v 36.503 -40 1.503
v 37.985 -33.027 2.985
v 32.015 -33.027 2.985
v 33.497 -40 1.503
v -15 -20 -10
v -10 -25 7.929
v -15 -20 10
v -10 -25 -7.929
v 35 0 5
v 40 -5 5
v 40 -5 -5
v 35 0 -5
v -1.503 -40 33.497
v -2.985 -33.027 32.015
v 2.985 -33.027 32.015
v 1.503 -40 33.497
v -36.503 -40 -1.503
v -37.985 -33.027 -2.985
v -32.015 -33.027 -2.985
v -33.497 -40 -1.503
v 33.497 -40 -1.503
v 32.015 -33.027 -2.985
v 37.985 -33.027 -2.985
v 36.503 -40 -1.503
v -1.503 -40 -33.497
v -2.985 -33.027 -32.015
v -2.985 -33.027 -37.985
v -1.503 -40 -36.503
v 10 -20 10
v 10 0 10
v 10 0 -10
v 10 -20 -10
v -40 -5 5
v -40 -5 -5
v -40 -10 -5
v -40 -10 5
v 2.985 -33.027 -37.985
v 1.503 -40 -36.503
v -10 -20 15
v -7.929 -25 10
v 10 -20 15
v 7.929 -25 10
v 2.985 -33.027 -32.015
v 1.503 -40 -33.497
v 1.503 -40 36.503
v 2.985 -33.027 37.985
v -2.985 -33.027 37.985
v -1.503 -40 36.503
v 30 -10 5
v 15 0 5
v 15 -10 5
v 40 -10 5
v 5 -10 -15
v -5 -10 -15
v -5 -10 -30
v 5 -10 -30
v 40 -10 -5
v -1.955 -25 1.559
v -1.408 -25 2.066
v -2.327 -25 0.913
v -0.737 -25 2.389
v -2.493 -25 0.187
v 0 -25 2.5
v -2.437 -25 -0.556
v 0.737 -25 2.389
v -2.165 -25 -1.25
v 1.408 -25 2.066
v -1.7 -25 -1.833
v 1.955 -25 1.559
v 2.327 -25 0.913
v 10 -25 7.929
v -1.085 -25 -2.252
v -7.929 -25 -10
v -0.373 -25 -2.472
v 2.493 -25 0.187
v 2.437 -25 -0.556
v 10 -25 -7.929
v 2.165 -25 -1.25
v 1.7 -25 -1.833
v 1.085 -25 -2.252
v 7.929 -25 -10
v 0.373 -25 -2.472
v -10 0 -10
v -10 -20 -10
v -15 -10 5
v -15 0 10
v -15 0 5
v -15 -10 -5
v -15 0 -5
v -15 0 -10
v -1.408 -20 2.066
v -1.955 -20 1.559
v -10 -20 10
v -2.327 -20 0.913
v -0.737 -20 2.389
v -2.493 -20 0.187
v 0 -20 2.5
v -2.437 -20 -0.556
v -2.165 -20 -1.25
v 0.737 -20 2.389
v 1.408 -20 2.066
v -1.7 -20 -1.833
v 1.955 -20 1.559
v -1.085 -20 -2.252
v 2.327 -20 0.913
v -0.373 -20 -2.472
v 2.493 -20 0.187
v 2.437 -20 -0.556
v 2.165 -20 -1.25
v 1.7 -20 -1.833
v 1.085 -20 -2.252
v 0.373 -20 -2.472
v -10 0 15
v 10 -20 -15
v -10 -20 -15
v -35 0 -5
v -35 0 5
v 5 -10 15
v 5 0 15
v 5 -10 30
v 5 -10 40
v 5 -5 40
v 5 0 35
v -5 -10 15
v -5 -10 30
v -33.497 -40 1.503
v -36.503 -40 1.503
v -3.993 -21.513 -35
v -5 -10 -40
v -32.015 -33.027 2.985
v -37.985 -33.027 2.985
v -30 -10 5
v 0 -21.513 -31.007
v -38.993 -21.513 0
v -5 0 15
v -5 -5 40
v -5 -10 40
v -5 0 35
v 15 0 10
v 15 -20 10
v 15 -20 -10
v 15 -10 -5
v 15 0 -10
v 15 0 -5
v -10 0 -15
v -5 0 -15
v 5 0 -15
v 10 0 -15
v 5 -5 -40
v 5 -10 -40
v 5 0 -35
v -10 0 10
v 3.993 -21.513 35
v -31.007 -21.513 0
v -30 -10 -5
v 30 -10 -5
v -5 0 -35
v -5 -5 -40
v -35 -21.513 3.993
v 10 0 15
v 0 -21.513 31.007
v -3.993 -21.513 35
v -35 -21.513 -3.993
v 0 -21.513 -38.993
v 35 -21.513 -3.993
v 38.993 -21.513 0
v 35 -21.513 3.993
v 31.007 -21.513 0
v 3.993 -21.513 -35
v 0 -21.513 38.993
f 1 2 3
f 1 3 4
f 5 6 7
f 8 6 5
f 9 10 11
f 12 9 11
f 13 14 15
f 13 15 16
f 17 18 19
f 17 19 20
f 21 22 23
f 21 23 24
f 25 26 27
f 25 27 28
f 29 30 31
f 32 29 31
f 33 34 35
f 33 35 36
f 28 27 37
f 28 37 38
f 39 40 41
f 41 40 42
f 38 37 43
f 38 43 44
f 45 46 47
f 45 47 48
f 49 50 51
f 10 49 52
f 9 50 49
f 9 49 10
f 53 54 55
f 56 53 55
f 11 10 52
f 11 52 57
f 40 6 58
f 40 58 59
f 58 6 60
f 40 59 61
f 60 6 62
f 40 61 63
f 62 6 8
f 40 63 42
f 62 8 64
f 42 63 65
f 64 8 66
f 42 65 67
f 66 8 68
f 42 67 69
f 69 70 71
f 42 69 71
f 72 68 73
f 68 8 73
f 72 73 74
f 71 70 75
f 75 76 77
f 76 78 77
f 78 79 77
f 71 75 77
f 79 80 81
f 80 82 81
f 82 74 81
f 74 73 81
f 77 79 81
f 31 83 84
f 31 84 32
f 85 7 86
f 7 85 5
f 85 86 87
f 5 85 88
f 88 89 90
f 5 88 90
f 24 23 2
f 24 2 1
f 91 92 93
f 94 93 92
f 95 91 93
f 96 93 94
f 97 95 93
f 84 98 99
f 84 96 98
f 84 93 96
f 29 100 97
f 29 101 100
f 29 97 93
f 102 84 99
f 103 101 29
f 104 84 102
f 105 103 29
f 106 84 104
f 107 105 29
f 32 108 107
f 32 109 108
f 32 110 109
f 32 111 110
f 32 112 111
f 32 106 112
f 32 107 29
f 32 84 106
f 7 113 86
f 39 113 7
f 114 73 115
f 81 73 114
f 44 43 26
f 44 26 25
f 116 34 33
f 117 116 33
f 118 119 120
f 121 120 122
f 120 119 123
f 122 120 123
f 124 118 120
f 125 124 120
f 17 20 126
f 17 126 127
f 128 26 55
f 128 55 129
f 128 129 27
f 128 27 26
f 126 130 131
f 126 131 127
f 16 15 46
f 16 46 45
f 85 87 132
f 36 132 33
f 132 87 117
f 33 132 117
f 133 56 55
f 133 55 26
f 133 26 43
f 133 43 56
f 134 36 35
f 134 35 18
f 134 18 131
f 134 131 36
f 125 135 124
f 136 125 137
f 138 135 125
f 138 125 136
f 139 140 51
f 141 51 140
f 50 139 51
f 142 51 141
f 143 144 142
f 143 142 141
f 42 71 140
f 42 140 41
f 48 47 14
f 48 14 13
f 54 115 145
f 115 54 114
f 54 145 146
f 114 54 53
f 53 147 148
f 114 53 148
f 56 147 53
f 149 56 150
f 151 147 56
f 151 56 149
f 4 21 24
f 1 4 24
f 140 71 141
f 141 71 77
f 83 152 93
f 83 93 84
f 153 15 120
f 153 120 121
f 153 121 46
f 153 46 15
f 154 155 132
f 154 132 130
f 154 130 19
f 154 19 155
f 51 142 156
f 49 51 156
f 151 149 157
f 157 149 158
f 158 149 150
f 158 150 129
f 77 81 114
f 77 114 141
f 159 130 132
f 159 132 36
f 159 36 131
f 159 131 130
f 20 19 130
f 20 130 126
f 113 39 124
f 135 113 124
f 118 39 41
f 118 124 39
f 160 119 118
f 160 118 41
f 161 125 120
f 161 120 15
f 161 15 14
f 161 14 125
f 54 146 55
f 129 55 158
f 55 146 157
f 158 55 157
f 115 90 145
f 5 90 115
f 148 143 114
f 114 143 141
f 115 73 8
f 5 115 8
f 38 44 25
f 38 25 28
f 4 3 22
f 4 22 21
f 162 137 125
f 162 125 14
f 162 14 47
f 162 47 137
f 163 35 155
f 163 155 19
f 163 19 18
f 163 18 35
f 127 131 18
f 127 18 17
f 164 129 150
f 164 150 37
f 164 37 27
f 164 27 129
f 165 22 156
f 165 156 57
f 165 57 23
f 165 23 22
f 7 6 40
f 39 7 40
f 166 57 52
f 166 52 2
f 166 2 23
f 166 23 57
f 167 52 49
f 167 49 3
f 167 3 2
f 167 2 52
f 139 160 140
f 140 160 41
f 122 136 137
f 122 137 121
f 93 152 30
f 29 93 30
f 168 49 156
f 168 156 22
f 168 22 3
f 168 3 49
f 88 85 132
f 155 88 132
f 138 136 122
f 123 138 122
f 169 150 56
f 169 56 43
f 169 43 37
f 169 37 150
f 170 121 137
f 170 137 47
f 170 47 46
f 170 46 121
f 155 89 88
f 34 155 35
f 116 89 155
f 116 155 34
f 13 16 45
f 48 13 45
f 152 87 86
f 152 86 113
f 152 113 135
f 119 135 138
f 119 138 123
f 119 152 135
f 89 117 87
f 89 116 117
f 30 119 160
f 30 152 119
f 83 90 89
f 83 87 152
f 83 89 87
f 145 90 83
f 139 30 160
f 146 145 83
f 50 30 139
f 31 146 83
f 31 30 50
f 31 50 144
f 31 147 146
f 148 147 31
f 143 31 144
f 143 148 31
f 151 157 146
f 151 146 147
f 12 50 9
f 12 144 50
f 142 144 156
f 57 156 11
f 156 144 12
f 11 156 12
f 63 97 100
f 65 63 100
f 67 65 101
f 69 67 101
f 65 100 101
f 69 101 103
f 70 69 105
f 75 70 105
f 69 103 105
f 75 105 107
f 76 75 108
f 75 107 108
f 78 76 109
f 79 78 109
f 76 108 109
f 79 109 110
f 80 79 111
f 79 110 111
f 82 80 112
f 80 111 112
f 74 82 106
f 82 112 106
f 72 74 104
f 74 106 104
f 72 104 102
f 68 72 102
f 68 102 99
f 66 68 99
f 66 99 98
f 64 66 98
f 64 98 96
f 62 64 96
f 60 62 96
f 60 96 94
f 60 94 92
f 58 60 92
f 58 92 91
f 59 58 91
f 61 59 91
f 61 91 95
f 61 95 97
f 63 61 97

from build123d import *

# Parameters (mm, degrees)
SKETCH1_W         = 30
SKETCH1_H         = 30
CENTER_DEPTH      = 25
SKETCH2_W         = 20
SKETCH2_H         = 20
CENTER_HOLE_DEPTH = 20
SKETCH3_W         = 25
SKETCH3_H         = 10
ARM_DEPTH         = 10
SKETCH5_R         = 2.5
SCREW_HOLE_DEPTH  = 48.16990566
SKETCH7_W         = 10
SKETCH7_H         = 10
LEG_DEPTH         = 30
LEG_TAPER         = 5
CIRPATTERN1_COUNT = 4
CHAMFER1_SIZE     = 5
CHAMFER2_SIZE     = 5
CHAMFER3_SIZE     = 5
CHAMFER4_SIZE     = 7
CHAMFER4_SIZE_2   = 0.872143839


with BuildPart() as part:
    # Sketch1 → center (new body)
    with BuildSketch(Plane(origin=(0, 0, 0), x_dir=(1, 0, 0), z_dir=(0, 1, 0))):
        Rectangle(SKETCH1_W, SKETCH1_H)
    extrude(amount=-CENTER_DEPTH)

    # Sketch2 → center hole (cut)
    with BuildSketch(Plane(origin=(0, 0, 0), x_dir=(1, 0, 0), z_dir=(0, 1, 0))):
        Rectangle(SKETCH2_W, SKETCH2_H)
    extrude(amount=-CENTER_HOLE_DEPTH, mode=Mode.SUBTRACT)

    # Sketch3 → arm (add)
    with BuildSketch(Plane(origin=(0, 0, 0), x_dir=(1, 0, 0), z_dir=(0, 1, 0))):
        with Locations((27.5, 0)):
            Rectangle(SKETCH3_W, SKETCH3_H)
    arm = extrude(amount=-ARM_DEPTH)

    # Sketch5 → screw hole (cut, through all)
    with BuildSketch(Plane(origin=(0, -20, 0), x_dir=(1, 0, 0), z_dir=(0, 1, 0))):
        with Locations(Location((0, 0, 0), (0, 0, 270))):
            Circle(SKETCH5_R)
    extrude(amount=-SCREW_HOLE_DEPTH, mode=Mode.SUBTRACT)

    # Sketch7 → leg (add)
    with BuildSketch(Plane.XZ.offset(10)):
        with Locations((35, 0)):
            Rectangle(SKETCH7_W, SKETCH7_H)
    leg = extrude(amount=LEG_DEPTH, taper=LEG_TAPER)

    # CirPattern1: arm, leg ×4 about axis
    cirpattern1_axis = Axis((0, 0, 0), (0, 1, 0))
    add([arm.rotate(cirpattern1_axis, i * 360 / CIRPATTERN1_COUNT) for i in range(1, CIRPATTERN1_COUNT)])
    add([leg.rotate(cirpattern1_axis, i * 360 / CIRPATTERN1_COUNT) for i in range(1, CIRPATTERN1_COUNT)])

    # Chamfer1
    chamfer1_edges = [part.edges().sort_by_distance(p)[0] for p in [
        (15, -12.5, 15),
        (-15, -12.5, 15),
        (-15, -12.5, -15),
        (15, -12.5, -15),
    ]]
    chamfer(chamfer1_edges, length=CHAMFER1_SIZE)

    # Chamfer2
    chamfer2_edges = [part.edges().sort_by_distance(p)[0] for p in [
        (40, 0, 0),
        (0, 0, -40),
        (-40, 0, 0),
        (0, 0, 40),
    ]]
    chamfer(chamfer2_edges, length=CHAMFER2_SIZE)

    # Chamfer3
    chamfer3_edges = [part.edges().sort_by_distance(p)[0] for p in [
        (-15, -25, 0),
        (0, -25, 15),
        (15, -25, 0),
        (0, -25, -15),
        (12.5, -25, 12.5),
        (12.5, -25, -12.5),
        (-12.5, -25, -12.5),
        (-12.5, -25, 12.5),
    ]]
    chamfer(chamfer3_edges, length=CHAMFER3_SIZE)

    # Chamfer4
    # the kernel refuses this chamfer: 7, 0.872143839 mm, written as the material it takes off along each edge
    with BuildSketch(Plane(origin=(-37.375340094, -40, 20.570322389), x_dir=(-0.08715574274765861, 0.9961946980917454, 0), z_dir=(0, 0, -1)), Plane(origin=(-55.570322389, -40, -2.375340094), x_dir=(0, 0.9961946980917455, -0.08715574274765818), z_dir=(1, 0, 0)), Plane(origin=(-32.624659906, -40, -20.570322389), x_dir=(0.08715574274765861, 0.9961946980917454, 0), z_dir=(0, 0, 1)), Plane(origin=(-14.429677611, -40, 2.375340094), x_dir=(0, 0.9961946980917455, 0.08715574274765825), z_dir=(-1, 0, 0)), Plane(origin=(20.570322389, -40, 37.375340094), x_dir=(0, 0.9961946980917454, 0.08715574274765861), z_dir=(-1, 0, 0)), Plane(origin=(-2.375340094, -40, 55.570322389), x_dir=(-0.08715574274765818, 0.9961946980917455, 0), z_dir=(0, 0, -1)), Plane(origin=(-20.570322389, -40, 32.624659906), x_dir=(0, 0.9961946980917454, -0.08715574274765861), z_dir=(1, 0, 0)), Plane(origin=(2.375340094, -40, 14.429677611), x_dir=(0.08715574274765818, 0.9961946980917455, 0), z_dir=(0, 0, 1)), Plane(origin=(37.375340094, -40, -20.570322389), x_dir=(0.08715574274765861, 0.9961946980917454, 0), z_dir=(0, 0, 1)), Plane(origin=(55.570322389, -40, 2.375340094), x_dir=(0, 0.9961946980917455, 0.08715574274765825), z_dir=(-1, 0, 0)), Plane(origin=(32.624659906, -40, 20.570322389), x_dir=(-0.08715574274765861, 0.9961946980917454, 0), z_dir=(0, 0, -1)), Plane(origin=(14.429677611, -40, -2.375340094), x_dir=(0, 0.9961946980917455, -0.08715574274765825), z_dir=(1, 0, 0)), Plane(origin=(-20.570322389, -40, -37.375340094), x_dir=(0, 0.9961946980917454, -0.08715574274765861), z_dir=(1, 0, 0)), Plane(origin=(2.375340094, -40, -55.570322389), x_dir=(0.08715574274765818, 0.9961946980917455, 0), z_dir=(0, 0, 1)), Plane(origin=(20.570322389, -40, -32.624659906), x_dir=(0, 0.9961946980917454, 0.08715574274765861), z_dir=(-1, 0, 0)), Plane(origin=(-2.375340094, -40, -14.429677611), x_dir=(-0.08715574274765818, 0.9961946980917455, 0), z_dir=(0, 0, -1))) as chamfer4_piece_1:
        Polygon((CHAMFER4_SIZE, 0), (-CHAMFER4_SIZE_2 * 0.0871557427705, CHAMFER4_SIZE_2 * 0.996194698353), (0, 0), align=None)
    extrude(amount=41.140644778, mode=Mode.SUBTRACT)


solid = part.part
